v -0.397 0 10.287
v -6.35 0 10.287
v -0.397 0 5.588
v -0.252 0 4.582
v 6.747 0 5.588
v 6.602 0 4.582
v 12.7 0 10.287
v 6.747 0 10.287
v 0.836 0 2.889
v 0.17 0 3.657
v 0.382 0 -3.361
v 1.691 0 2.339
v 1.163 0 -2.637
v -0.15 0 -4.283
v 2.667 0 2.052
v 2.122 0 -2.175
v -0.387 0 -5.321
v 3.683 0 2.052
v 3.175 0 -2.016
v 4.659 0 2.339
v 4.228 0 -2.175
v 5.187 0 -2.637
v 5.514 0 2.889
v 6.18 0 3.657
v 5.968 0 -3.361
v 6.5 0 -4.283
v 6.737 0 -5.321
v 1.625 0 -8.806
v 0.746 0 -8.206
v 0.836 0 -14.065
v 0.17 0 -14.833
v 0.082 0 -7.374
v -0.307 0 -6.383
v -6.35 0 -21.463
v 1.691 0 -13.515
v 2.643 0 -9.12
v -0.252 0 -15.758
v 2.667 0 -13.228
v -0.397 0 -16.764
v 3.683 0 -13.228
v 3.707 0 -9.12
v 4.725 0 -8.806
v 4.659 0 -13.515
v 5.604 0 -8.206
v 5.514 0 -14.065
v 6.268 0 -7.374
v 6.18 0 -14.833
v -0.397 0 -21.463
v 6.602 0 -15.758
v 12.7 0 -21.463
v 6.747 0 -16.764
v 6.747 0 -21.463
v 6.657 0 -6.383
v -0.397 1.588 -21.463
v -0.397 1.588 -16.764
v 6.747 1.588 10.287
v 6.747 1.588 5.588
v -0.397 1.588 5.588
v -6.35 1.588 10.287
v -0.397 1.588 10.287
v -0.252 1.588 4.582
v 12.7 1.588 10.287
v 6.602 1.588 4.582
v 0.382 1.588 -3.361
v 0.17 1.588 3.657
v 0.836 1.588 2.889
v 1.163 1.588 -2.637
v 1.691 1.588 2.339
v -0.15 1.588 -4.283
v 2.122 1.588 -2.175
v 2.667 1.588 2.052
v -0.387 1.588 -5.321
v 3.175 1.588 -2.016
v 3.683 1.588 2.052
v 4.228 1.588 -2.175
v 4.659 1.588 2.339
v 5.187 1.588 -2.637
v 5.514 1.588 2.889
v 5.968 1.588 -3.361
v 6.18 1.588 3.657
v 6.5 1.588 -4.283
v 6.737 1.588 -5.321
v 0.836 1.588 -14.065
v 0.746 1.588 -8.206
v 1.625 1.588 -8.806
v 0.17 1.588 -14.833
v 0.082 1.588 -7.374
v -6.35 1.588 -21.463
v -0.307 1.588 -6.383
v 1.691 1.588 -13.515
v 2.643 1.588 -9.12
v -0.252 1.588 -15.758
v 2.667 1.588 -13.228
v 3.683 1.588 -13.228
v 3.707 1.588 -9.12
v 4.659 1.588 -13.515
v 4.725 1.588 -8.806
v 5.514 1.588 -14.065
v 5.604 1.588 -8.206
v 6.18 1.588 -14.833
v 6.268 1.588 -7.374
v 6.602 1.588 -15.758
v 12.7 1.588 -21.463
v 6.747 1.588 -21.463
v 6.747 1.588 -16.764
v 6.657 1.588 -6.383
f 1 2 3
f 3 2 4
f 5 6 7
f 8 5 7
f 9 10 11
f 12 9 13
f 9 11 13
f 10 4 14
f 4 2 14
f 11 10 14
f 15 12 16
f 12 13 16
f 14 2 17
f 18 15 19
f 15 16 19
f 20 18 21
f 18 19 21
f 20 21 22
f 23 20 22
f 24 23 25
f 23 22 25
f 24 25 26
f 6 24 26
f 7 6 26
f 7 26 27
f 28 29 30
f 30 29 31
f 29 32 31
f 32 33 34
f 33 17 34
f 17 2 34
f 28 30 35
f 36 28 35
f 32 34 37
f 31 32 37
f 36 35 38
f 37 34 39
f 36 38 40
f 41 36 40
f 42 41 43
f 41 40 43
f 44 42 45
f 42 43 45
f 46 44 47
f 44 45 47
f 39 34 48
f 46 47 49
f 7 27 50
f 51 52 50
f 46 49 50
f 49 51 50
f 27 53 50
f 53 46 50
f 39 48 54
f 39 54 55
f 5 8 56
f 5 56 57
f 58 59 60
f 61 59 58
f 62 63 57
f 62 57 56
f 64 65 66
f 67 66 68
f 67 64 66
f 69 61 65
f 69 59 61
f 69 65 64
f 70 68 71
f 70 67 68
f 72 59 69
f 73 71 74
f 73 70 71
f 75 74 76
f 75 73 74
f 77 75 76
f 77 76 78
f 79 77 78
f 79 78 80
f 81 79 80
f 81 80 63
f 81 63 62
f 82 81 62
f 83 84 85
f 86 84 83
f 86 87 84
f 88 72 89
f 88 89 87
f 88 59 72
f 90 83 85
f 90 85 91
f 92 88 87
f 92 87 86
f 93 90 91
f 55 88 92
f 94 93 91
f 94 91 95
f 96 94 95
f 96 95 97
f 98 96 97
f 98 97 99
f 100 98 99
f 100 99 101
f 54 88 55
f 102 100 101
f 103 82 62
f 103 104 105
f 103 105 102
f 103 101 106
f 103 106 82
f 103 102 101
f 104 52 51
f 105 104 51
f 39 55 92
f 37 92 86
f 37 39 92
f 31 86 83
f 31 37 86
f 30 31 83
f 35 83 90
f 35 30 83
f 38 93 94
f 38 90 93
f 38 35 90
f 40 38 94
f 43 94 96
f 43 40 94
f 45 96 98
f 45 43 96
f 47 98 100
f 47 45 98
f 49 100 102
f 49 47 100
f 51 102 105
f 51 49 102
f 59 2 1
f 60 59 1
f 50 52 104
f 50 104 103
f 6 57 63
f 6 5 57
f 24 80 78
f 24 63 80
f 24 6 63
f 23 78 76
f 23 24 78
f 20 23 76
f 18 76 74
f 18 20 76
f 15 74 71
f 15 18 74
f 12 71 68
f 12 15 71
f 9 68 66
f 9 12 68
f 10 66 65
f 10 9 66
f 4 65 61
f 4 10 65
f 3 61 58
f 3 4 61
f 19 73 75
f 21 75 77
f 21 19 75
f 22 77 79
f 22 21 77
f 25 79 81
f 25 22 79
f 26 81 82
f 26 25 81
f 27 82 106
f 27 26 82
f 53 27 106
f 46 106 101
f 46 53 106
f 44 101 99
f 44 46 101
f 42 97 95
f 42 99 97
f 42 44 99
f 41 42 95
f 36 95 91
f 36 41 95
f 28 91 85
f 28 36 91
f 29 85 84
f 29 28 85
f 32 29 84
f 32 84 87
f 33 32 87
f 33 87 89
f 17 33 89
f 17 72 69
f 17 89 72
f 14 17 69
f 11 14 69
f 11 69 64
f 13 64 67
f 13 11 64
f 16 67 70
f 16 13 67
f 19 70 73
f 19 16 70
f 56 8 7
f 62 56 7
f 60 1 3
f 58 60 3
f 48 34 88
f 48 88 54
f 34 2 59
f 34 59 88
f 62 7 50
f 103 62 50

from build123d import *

# Parameters (mm, degrees)
SKETCH1_W          = 19.05
SKETCH1_H          = 31.75
EXTRUDE1_DEPTH     = 1.5875
SKETCH3_R          = 3.571875
CUT_EXTRUDE6_DEPTH = 25.989408261
SKETCH5_R          = 3.571875
CUT_EXTRUDE8_DEPTH = 25.989408261
CIRPATTERN1_COUNT  = 2
SKETCH6_W          = 7.14375
SKETCH6_H          = 4.699
CUT_EXTRUDE9_DEPTH = 25.989408261
CIRPATTERN2_COUNT  = 2


with BuildPart() as part:
    # Sketch1 → Extrude1 (new body)
    with BuildSketch(Plane(origin=(0, 0, 0), x_dir=(1, 0, 0), z_dir=(0, 1, 0))):
        with Locations((3.175, 5.588)):
            Rectangle(SKETCH1_W, SKETCH1_H)
    extrude(amount=EXTRUDE1_DEPTH)

    # Sketch3 → Cut-Extrude6 (cut, through all)
    with BuildSketch(Plane(origin=(0, 0, 0), x_dir=(1, 0, 0), z_dir=(0, 1, 0))):
        with Locations(Location((3.175, 5.588, 0), (0, 0, 270))):
            Circle(SKETCH3_R)
    extrude(amount=CUT_EXTRUDE6_DEPTH, mode=Mode.SUBTRACT)

    # Sketch5 → Cut-Extrude8 (cut, through all)
    with BuildSketch(Plane(origin=(0, 0, 0), x_dir=(1, 0, 0), z_dir=(0, 1, 0))):
        with Locations(Location((3.175, 16.764, 0), (0, 0, 270))):
            Circle(SKETCH5_R)
    cut_extrude8 = extrude(amount=CUT_EXTRUDE8_DEPTH, mode=Mode.SUBTRACT)

    # CirPattern1: Cut-Extrude8 ×2 about axis
    cirpattern1_axis = Axis((3.175, 0, -5.588), (0, 1, 0))
    for i in range(1, CIRPATTERN1_COUNT):
        add(cut_extrude8.rotate(cirpattern1_axis, i * 360 / CIRPATTERN1_COUNT), mode=Mode.SUBTRACT)

    # Sketch6 → Cut-Extrude9 (cut, through all)
    with BuildSketch(Plane(origin=(0, 0, 0), x_dir=(1, 0, 0), z_dir=(0, 1, 0))):
        with Locations((3.175, -7.9375)):
            Rectangle(SKETCH6_W, SKETCH6_H)
    cut_extrude9 = extrude(amount=CUT_EXTRUDE9_DEPTH, mode=Mode.SUBTRACT)

    # CirPattern2: Cut-Extrude9 ×2 about axis
    cirpattern2_axis = Axis((3.175, 1.5875, -5.588), (0, -1, 0))
    for i in range(1, CIRPATTERN2_COUNT):
        add(cut_extrude9.rotate(cirpattern2_axis, i * 360 / CIRPATTERN2_COUNT), mode=Mode.SUBTRACT)


solid = part.part
